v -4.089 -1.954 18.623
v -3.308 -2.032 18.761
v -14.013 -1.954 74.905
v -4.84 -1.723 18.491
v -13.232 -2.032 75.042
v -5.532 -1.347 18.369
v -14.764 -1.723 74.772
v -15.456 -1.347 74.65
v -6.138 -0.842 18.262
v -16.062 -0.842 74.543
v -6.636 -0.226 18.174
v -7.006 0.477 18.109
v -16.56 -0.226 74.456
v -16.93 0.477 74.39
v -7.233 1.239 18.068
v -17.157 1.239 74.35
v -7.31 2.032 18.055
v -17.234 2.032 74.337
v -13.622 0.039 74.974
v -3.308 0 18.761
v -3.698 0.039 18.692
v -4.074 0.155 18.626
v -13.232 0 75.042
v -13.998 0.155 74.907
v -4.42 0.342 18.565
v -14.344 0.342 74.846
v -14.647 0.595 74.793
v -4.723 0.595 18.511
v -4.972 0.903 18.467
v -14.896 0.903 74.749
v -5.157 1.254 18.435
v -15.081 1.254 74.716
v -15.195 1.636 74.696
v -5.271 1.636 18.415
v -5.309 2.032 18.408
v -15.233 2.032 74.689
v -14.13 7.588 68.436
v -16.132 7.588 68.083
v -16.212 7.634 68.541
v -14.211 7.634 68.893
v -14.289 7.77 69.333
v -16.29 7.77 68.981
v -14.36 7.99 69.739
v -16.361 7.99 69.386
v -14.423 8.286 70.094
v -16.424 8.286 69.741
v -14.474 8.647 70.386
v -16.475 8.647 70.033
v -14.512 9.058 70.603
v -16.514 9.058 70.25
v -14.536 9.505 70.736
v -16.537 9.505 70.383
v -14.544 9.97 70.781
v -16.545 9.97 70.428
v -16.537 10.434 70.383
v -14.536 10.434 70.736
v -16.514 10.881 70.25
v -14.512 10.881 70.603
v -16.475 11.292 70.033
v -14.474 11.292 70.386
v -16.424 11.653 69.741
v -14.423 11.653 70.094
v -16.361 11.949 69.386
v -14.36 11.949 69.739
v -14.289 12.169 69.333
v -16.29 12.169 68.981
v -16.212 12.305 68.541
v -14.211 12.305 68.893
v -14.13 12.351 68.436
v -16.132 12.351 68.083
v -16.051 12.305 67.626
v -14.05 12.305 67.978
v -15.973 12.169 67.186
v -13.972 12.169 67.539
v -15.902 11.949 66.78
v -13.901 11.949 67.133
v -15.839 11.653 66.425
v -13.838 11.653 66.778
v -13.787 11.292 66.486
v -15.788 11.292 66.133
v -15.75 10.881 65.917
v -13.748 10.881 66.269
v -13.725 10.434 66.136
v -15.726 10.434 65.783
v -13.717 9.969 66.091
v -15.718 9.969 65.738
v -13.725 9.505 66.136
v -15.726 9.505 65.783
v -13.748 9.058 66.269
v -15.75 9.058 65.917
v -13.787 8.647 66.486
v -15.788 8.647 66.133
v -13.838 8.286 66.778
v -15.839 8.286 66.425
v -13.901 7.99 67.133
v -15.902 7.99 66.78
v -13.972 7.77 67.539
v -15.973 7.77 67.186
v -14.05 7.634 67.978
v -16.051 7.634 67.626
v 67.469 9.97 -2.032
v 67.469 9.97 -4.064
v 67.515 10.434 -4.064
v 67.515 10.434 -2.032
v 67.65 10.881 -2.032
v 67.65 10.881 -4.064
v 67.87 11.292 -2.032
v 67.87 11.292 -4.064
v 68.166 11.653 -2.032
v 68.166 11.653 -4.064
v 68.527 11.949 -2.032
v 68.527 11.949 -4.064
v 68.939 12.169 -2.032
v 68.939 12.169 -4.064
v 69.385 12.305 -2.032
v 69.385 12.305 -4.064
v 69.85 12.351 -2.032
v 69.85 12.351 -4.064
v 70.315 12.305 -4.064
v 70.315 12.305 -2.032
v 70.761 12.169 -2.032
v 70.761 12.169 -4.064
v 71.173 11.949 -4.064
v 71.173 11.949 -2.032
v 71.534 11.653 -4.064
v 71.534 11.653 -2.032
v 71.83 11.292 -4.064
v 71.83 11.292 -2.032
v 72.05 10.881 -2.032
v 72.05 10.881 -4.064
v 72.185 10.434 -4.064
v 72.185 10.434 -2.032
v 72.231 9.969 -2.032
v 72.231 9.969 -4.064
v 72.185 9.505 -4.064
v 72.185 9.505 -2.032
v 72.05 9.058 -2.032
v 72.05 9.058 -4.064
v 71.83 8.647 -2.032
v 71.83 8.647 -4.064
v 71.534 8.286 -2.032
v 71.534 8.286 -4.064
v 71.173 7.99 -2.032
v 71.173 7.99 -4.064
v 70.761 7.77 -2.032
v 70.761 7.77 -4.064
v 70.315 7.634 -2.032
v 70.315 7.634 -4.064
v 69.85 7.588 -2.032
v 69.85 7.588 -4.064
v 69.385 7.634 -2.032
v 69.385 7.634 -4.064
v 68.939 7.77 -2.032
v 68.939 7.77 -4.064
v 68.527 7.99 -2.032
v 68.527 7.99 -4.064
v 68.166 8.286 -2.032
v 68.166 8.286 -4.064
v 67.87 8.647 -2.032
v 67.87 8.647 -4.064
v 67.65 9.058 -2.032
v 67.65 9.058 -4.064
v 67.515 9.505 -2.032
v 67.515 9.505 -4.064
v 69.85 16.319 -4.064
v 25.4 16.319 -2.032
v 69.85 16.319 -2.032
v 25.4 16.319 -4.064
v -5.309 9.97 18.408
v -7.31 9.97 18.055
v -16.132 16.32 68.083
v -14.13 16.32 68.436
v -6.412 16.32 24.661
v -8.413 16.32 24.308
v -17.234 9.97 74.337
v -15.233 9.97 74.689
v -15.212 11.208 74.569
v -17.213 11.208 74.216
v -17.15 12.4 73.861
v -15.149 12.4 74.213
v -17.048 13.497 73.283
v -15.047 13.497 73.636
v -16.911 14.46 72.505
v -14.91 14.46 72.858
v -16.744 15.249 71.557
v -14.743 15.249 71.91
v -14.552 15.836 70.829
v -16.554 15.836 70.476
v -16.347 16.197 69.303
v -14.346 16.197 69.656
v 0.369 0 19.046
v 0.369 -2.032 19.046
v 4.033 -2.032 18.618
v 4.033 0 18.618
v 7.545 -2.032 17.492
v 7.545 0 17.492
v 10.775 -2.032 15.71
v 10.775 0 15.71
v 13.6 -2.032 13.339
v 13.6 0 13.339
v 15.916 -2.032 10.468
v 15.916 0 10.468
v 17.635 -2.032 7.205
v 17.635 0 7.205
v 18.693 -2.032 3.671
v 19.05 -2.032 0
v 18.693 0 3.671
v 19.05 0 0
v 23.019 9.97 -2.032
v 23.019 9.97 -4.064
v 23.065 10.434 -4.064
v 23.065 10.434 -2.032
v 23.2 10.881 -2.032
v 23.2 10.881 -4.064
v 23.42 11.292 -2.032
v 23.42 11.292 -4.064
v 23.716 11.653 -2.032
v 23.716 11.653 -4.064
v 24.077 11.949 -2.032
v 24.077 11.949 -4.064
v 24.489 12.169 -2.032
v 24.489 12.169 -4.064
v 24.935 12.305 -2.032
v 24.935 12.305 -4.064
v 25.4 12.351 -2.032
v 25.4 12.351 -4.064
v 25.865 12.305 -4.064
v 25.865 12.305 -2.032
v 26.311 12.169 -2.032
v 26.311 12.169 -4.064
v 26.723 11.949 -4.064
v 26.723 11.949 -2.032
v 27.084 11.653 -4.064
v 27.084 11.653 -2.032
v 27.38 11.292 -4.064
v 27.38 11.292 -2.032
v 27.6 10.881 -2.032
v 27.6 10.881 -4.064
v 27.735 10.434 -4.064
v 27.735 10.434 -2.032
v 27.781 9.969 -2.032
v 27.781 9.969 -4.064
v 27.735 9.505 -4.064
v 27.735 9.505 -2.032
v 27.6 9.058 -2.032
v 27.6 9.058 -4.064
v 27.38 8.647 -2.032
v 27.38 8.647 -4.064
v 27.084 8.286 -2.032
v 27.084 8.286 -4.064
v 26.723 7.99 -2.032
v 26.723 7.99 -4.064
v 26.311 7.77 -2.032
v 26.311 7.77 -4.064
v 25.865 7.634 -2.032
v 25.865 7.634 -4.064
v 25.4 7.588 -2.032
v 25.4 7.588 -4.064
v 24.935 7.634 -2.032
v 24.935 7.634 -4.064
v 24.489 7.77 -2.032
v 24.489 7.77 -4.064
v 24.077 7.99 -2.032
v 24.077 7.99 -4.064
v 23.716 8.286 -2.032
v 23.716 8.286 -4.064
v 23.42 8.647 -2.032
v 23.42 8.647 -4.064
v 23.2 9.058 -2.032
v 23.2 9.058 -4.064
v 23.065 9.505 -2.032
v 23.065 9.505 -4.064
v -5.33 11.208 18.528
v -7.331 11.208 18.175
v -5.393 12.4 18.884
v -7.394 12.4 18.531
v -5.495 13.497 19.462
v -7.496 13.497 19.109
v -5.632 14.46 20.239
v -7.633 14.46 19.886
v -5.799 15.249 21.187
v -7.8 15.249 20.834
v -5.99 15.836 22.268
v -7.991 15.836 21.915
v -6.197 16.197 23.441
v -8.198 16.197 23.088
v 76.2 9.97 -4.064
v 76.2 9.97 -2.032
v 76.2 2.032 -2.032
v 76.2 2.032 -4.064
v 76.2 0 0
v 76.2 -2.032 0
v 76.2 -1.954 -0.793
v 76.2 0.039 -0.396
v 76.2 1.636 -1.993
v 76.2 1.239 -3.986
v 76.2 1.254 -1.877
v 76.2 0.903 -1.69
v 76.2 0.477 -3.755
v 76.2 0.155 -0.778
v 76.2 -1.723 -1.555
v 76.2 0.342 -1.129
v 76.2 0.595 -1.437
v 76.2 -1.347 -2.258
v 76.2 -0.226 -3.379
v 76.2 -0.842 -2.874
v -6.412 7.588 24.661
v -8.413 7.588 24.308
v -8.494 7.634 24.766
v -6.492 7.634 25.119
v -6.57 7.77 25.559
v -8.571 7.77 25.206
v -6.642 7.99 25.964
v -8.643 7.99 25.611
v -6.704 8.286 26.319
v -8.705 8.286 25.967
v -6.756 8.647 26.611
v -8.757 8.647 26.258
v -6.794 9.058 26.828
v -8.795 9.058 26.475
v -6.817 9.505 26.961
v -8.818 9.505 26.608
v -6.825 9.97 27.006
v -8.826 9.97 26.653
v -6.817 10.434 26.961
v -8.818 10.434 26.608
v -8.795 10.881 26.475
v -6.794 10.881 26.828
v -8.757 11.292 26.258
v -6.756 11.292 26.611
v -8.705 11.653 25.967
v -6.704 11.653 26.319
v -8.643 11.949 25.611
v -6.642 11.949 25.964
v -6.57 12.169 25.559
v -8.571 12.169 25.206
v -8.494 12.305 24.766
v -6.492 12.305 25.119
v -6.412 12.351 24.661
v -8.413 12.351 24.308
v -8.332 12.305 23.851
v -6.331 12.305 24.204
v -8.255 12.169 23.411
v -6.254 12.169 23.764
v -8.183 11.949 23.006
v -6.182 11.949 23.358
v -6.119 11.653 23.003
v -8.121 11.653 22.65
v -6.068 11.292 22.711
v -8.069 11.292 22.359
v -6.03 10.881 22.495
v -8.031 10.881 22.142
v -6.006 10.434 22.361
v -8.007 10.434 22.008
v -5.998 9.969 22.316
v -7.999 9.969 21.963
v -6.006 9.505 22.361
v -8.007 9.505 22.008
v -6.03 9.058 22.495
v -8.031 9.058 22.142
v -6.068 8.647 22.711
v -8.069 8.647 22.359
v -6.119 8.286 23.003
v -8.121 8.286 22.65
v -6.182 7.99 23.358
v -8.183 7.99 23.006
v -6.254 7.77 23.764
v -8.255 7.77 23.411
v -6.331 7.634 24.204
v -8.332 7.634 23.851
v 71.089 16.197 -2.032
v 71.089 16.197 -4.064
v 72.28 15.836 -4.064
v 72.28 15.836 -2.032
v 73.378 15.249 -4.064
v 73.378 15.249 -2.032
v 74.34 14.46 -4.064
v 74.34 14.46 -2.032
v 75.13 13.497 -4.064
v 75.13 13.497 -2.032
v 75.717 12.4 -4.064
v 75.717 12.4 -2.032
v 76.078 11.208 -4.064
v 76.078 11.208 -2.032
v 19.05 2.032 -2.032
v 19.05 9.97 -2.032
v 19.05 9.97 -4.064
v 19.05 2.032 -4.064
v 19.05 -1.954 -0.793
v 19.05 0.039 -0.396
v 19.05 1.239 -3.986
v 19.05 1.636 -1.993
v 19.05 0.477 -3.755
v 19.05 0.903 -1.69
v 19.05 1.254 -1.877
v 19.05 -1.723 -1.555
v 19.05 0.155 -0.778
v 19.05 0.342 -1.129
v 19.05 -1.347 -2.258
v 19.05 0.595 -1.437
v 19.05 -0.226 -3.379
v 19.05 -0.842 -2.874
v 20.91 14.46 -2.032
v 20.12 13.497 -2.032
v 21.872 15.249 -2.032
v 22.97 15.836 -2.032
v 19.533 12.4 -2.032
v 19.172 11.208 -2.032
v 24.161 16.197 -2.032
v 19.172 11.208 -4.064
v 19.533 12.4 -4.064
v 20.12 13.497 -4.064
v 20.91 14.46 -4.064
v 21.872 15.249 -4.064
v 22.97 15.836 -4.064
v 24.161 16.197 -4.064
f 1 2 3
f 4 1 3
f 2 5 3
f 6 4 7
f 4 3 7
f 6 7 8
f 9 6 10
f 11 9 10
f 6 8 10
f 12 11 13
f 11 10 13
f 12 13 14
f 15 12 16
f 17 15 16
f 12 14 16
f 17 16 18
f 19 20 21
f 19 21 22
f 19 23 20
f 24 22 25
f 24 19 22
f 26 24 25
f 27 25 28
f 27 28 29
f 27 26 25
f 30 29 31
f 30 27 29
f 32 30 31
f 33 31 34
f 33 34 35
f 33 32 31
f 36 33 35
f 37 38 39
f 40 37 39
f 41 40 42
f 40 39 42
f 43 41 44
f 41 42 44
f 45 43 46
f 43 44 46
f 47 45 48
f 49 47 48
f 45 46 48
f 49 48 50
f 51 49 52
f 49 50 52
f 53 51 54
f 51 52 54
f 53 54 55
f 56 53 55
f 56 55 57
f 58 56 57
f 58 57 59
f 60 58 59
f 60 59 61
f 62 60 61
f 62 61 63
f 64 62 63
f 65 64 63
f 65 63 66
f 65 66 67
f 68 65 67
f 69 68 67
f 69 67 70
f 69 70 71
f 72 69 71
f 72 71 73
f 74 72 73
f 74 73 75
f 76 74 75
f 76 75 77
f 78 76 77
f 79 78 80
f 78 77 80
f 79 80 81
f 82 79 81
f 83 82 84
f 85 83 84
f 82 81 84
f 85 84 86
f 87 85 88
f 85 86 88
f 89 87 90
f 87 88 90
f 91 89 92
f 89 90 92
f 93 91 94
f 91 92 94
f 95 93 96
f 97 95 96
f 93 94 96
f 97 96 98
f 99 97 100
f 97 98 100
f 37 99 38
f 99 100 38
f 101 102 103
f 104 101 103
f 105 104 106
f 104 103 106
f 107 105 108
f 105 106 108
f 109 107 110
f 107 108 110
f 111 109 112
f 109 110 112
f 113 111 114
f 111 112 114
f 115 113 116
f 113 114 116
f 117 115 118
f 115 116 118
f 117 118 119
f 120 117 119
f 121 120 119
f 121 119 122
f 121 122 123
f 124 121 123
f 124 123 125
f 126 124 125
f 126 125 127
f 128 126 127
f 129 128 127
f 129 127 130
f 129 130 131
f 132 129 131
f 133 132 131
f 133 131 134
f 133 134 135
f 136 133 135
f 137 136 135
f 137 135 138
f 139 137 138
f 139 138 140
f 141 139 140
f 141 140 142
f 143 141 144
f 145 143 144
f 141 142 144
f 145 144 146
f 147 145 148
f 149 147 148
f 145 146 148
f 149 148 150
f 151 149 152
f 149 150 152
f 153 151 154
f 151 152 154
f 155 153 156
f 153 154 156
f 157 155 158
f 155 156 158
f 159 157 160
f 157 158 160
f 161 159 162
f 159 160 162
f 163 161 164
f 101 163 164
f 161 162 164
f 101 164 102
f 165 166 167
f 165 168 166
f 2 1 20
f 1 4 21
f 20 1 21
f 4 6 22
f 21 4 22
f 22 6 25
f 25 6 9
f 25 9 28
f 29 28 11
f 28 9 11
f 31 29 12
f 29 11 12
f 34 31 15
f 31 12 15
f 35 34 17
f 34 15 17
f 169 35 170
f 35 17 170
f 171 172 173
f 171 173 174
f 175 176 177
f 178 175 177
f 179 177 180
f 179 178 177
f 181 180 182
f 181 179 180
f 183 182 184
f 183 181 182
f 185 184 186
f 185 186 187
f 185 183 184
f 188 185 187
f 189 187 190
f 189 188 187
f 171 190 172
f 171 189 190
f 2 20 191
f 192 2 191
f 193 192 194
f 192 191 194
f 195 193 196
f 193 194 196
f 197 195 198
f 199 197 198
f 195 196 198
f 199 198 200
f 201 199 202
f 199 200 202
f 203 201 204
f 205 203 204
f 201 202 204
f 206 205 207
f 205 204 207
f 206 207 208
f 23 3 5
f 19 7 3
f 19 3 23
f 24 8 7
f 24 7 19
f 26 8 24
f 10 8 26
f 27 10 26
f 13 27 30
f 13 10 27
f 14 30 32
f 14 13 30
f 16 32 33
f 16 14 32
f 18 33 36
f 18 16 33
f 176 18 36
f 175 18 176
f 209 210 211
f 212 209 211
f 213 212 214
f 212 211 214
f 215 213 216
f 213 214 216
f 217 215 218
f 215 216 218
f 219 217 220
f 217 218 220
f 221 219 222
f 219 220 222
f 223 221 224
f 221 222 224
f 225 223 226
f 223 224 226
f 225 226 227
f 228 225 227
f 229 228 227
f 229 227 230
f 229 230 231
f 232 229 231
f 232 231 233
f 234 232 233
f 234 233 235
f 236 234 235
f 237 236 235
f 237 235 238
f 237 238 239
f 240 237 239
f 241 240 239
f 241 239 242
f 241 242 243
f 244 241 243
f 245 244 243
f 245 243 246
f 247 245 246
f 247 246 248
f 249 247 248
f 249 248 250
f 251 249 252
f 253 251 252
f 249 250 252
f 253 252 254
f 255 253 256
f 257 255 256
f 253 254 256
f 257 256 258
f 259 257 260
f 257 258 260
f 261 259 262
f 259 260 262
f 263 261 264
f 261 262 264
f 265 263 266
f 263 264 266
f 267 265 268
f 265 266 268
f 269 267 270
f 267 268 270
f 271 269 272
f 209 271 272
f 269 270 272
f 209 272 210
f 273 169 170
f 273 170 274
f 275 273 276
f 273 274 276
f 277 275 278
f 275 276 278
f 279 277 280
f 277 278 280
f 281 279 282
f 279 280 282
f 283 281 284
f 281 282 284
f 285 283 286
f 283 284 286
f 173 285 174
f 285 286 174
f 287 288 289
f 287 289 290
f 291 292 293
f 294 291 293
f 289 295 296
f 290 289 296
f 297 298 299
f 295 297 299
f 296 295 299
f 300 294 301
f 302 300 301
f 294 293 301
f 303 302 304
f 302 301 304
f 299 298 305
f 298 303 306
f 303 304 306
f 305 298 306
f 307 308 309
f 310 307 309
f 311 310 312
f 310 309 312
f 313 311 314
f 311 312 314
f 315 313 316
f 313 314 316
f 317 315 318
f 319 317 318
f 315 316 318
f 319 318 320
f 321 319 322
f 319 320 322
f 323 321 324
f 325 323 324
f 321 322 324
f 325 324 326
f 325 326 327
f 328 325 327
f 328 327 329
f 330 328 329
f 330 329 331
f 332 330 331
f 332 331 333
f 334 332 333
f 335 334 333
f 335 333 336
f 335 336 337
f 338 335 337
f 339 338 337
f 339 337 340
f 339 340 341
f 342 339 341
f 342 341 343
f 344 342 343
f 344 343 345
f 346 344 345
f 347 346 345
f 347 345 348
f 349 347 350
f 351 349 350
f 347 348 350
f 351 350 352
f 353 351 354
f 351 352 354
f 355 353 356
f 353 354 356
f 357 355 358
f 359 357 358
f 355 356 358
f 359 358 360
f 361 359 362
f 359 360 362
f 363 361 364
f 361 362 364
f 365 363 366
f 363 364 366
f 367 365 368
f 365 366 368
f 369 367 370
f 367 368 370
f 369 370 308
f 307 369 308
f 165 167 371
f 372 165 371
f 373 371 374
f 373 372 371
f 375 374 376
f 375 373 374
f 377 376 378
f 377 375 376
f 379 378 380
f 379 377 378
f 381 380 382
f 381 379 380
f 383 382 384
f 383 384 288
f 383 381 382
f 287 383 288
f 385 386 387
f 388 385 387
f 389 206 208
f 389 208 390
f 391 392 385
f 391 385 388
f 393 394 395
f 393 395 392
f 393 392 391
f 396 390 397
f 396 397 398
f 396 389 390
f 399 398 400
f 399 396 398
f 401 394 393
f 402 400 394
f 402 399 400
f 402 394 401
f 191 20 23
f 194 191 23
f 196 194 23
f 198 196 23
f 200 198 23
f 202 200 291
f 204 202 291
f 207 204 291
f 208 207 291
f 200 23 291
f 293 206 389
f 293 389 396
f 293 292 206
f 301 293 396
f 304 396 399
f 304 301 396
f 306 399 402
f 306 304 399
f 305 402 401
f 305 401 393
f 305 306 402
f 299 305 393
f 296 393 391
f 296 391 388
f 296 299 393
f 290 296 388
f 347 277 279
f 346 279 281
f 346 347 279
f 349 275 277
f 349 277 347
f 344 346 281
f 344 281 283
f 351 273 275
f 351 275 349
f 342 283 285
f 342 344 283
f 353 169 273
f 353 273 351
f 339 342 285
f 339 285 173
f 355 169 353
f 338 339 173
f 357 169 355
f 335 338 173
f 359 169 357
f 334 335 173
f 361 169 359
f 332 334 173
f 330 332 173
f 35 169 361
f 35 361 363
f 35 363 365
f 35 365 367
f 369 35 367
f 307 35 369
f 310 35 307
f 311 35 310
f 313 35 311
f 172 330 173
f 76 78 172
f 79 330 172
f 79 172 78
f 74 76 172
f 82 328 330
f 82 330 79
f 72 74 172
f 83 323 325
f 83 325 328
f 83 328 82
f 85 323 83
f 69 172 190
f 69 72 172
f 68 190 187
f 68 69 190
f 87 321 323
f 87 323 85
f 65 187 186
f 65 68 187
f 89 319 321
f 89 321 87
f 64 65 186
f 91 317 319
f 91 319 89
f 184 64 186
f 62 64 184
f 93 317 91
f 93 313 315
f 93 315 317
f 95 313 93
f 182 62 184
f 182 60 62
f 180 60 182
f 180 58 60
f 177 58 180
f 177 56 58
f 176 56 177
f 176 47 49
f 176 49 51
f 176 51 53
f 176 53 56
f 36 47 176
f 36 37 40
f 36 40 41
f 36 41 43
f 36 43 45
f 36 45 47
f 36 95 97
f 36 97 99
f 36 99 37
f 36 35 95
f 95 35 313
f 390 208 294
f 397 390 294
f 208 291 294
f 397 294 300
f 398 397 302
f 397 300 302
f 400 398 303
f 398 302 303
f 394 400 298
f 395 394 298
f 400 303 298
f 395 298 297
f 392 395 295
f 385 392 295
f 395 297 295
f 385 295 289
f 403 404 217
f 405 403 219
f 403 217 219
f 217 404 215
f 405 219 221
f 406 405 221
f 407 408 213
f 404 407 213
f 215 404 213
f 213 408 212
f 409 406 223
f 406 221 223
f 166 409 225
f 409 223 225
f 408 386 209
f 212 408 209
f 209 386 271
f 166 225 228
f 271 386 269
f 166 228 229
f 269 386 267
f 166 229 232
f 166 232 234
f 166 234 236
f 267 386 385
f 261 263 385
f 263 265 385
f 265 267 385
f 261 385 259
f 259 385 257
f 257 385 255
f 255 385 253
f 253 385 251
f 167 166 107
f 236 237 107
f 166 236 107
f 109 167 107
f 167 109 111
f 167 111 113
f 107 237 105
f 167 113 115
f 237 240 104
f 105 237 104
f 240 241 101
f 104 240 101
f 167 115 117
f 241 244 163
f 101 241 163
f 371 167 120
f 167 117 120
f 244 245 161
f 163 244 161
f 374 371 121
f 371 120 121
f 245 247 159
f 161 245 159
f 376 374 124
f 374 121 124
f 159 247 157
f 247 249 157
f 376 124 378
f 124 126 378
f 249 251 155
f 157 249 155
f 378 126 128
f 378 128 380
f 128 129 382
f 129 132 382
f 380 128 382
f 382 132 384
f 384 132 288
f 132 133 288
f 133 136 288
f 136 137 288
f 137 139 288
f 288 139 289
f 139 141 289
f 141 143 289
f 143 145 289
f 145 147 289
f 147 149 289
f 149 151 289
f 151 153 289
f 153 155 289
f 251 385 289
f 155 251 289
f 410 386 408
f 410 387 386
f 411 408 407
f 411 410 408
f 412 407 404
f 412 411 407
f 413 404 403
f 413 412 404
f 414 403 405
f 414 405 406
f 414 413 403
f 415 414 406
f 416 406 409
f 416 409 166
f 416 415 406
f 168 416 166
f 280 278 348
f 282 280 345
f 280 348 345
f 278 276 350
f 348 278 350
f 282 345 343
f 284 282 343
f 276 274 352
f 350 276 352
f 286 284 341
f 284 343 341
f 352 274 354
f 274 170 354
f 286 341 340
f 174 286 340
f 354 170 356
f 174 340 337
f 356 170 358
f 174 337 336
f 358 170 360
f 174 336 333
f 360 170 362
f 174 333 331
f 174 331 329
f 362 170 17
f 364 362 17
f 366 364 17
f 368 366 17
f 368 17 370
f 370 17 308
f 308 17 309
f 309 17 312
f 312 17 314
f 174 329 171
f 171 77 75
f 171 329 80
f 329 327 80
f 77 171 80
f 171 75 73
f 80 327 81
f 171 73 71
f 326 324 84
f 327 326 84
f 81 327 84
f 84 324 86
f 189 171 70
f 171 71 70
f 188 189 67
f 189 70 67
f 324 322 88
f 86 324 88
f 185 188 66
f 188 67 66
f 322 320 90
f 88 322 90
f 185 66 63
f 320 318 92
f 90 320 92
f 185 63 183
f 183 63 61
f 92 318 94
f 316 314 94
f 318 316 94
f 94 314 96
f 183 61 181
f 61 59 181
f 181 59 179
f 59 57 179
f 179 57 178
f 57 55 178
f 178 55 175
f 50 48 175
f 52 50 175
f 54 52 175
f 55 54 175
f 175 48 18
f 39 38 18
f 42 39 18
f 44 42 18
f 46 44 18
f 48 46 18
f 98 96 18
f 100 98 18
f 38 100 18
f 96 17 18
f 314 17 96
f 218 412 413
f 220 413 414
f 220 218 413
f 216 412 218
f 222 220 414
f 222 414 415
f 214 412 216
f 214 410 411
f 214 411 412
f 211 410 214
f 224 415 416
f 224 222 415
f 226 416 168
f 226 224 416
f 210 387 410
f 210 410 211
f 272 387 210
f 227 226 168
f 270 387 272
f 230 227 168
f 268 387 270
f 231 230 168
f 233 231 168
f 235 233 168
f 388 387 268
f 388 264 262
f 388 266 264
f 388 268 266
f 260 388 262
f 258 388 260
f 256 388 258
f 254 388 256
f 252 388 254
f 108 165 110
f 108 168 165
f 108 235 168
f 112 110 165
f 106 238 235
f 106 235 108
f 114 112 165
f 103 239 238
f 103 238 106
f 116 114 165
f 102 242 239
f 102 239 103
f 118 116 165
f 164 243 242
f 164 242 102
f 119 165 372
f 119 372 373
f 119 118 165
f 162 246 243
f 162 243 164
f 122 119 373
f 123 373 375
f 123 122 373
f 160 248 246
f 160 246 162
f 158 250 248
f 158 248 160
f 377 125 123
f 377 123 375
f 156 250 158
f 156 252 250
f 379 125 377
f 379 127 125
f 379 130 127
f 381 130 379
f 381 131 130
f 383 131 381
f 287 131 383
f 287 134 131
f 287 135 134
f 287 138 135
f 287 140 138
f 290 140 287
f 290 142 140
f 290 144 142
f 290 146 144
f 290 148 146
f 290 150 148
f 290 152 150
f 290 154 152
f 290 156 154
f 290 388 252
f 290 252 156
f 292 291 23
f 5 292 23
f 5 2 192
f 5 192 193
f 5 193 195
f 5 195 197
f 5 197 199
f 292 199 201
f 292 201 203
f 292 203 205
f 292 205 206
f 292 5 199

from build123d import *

# Parameters (mm, degrees)
F1_DEPTH    = 2.032
F2_W        = 57.15
F2_H        = 2.032
F3_ANGLE    = 90
F4_W        = 2.032
F4_H        = 57.15
F5_ANGLE    = 90
F6_DEPTH    = 14.2875
F7_R        = 6.35
F10_D       = 4.7625
F10_ON_F8_D = 4.7625


with BuildPart() as f1:
    # F0 (on Front) → F1 (new body)
    with BuildSketch(Plane.XZ):
        with BuildLine():
            Line((-13.2319911382, 75.0423507795), (-3.3079977846, 18.7605876949))
            ThreePointArc((-3.3079977846, 18.7605876949), (12.2451039645, 14.5931466414), (19.05, 0))
            Line((19.05, 0), (76.2, 0))
            Line((76.2, 0), (-13.2319911382, 75.0423507795))
        make_face()
    extrude(amount=F1_DEPTH)

    # F2 (on face) → F3 (revolve)
    with BuildSketch(Plane(origin=(0, 0, 0), x_dir=(1, 0, 0), z_dir=(0, 0, -1))):
        with Locations((47.625, 1.016)):
            Rectangle(F2_W, F2_H)
    revolve(axis=Axis((40.305102244, 2.032, 0), (1, 0, 0)), revolution_arc=F3_ANGLE)

    # F4 (on face) → F5 (revolve)
    with BuildSketch(Plane(origin=(0, 0, 0), x_dir=(0, -1, 0), z_dir=(-0.984807753, 0, -0.1736481777))):
        with Locations((1.016, 47.625)):
            Rectangle(F4_W, F4_H)
    revolve(axis=Axis((-5.7906206967, 2.032, 32.8402418815), (0.1736481777, 0, -0.984807753)), revolution_arc=F5_ANGLE)

    # F6 (add): faces of the model
    f6_faces = [f1.faces().sort_by_distance(p)[0] for p in [
        (47.625, 2.032, -3.048),
        (-11.2716884926, 2.032, 46.3721895917),
    ]]
    extrude(f6_faces, amount=F6_DEPTH)

    # F7
    f7_edges = [f1.edges().sort_by_distance(p)[0] for p in [
        (-16.233685, 16.3195, 74.513071),
        (-6.309692, 16.3195, 18.231308),
        (19.05, 16.3195, -3.048),
        (76.2, 16.3195, -3.048),
    ]]
    fillet(f7_edges, radius=F7_R)

    # F10 (through all)
    with Locations(Plane.XY.offset(-2.032)):
        with Locations((25.4, 9.9695), (69.85, 9.9695)):
            Hole(F10_D / 2)

    # F10 on F8 (through all)
    with Locations(Plane(origin=(-2.0011293541, 0, -0.352853097), x_dir=(0, 1, 0), z_dir=(0.984807753, 0, 0.1736481777))):
        with Locations((9.9695, 25.4), (9.9695, 69.85)):
            Hole(F10_ON_F8_D / 2)


solid = f1.part
